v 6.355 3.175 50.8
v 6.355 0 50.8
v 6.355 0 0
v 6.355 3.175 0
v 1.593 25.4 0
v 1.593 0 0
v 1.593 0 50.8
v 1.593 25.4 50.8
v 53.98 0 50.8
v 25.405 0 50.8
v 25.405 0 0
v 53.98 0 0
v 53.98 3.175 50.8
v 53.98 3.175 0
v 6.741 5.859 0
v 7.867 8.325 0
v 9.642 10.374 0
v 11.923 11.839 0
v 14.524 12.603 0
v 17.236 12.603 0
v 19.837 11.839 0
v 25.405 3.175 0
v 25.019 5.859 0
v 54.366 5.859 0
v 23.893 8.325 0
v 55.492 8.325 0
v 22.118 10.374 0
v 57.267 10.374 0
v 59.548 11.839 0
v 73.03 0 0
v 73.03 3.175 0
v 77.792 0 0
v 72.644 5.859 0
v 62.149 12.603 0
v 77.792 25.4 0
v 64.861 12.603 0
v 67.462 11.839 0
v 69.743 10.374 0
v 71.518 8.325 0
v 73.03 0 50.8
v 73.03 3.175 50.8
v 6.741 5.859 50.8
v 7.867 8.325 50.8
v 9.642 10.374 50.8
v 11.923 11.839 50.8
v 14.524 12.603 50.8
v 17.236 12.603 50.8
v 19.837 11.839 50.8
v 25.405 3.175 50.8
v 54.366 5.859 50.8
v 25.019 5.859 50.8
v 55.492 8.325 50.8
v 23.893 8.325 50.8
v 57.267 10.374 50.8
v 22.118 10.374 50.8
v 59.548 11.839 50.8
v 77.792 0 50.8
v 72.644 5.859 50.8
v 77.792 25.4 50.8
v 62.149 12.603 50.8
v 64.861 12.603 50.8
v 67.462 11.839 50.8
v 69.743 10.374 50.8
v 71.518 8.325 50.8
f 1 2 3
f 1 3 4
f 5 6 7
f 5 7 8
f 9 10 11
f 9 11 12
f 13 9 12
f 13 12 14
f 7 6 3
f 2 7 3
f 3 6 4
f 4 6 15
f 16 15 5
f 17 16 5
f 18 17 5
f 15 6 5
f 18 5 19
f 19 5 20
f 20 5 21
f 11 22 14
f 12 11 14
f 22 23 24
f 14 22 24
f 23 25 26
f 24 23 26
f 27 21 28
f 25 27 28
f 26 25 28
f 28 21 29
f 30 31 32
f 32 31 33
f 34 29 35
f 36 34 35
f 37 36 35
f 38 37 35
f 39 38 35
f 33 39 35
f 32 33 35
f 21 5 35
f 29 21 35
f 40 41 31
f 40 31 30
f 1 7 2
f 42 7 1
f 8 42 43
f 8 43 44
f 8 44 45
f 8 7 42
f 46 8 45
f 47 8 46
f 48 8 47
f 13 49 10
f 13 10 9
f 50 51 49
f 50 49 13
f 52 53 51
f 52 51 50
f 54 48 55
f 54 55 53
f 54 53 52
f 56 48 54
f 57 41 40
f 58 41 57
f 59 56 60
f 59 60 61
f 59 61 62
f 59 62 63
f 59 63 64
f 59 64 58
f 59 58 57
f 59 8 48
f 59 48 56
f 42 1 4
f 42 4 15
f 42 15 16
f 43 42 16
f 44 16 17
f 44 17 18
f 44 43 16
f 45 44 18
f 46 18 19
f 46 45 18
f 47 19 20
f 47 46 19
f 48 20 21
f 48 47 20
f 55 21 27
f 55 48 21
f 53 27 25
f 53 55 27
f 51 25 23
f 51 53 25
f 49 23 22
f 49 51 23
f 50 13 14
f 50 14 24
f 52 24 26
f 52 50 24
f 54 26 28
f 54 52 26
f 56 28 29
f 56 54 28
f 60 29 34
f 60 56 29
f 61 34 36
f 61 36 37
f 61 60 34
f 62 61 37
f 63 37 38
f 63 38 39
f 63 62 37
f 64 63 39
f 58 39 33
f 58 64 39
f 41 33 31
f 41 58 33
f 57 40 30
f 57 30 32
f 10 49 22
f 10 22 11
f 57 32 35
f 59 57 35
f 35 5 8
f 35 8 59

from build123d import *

# Parameters (mm, degrees)
CROQUIS2_W              = 76.2
CROQUIS2_H              = 50.8
CROQUIS2_R              = 9.525
SALIENTE_EXTRUIR1_DEPTH = 50.8
CROQUIS3_W              = 76.2
CROQUIS3_H              = 25.4
CORTAR_EXTRUIR1_DEPTH   = 50.8
CORTAR_EXTRUIR2_DEPTH   = 50.8


with BuildPart() as part:
    # Croquis2 → Saliente-Extruir1 (new body)
    with BuildSketch(Plane.XY):
        with Locations((39.6925, 0)):
            Rectangle(CROQUIS2_W, CROQUIS2_H)
        with Locations((15.88, 0)):
            Circle(CROQUIS2_R, mode=Mode.SUBTRACT)
        with Locations((63.505, 0)):
            Circle(CROQUIS2_R, mode=Mode.SUBTRACT)
    extrude(amount=SALIENTE_EXTRUIR1_DEPTH)

    # Croquis3 → Cortar-Extruir1 (cut)
    with BuildSketch(Plane.XY.offset(50.8)):
        with Locations((39.6925, -12.7)):
            Rectangle(CROQUIS3_W, CROQUIS3_H)
    extrude(amount=-CORTAR_EXTRUIR1_DEPTH, mode=Mode.SUBTRACT)

    # Croquis4 → Cortar-Extruir2 (cut)
    with BuildSketch(Plane.XY.offset(50.8)):
        with BuildLine():
            Line((6.355, 0), (6.355, 3.175))
            ThreePointArc((6.355, 3.175), (15.88, 12.7), (25.405, 3.175))
            Line((25.405, 3.175), (25.405, 0))
            Line((25.405, 0), (6.355, 0))
        make_face()
        with BuildLine():
            Line((73.03, 0), (53.98, 0))
            Line((53.98, 0), (53.98, 3.175))
            ThreePointArc((53.98, 3.175), (63.505, 12.7), (73.03, 3.175))
            Line((73.03, 3.175), (73.03, 0))
        make_face()
    extrude(amount=-CORTAR_EXTRUIR2_DEPTH, mode=Mode.SUBTRACT)


solid = part.part
